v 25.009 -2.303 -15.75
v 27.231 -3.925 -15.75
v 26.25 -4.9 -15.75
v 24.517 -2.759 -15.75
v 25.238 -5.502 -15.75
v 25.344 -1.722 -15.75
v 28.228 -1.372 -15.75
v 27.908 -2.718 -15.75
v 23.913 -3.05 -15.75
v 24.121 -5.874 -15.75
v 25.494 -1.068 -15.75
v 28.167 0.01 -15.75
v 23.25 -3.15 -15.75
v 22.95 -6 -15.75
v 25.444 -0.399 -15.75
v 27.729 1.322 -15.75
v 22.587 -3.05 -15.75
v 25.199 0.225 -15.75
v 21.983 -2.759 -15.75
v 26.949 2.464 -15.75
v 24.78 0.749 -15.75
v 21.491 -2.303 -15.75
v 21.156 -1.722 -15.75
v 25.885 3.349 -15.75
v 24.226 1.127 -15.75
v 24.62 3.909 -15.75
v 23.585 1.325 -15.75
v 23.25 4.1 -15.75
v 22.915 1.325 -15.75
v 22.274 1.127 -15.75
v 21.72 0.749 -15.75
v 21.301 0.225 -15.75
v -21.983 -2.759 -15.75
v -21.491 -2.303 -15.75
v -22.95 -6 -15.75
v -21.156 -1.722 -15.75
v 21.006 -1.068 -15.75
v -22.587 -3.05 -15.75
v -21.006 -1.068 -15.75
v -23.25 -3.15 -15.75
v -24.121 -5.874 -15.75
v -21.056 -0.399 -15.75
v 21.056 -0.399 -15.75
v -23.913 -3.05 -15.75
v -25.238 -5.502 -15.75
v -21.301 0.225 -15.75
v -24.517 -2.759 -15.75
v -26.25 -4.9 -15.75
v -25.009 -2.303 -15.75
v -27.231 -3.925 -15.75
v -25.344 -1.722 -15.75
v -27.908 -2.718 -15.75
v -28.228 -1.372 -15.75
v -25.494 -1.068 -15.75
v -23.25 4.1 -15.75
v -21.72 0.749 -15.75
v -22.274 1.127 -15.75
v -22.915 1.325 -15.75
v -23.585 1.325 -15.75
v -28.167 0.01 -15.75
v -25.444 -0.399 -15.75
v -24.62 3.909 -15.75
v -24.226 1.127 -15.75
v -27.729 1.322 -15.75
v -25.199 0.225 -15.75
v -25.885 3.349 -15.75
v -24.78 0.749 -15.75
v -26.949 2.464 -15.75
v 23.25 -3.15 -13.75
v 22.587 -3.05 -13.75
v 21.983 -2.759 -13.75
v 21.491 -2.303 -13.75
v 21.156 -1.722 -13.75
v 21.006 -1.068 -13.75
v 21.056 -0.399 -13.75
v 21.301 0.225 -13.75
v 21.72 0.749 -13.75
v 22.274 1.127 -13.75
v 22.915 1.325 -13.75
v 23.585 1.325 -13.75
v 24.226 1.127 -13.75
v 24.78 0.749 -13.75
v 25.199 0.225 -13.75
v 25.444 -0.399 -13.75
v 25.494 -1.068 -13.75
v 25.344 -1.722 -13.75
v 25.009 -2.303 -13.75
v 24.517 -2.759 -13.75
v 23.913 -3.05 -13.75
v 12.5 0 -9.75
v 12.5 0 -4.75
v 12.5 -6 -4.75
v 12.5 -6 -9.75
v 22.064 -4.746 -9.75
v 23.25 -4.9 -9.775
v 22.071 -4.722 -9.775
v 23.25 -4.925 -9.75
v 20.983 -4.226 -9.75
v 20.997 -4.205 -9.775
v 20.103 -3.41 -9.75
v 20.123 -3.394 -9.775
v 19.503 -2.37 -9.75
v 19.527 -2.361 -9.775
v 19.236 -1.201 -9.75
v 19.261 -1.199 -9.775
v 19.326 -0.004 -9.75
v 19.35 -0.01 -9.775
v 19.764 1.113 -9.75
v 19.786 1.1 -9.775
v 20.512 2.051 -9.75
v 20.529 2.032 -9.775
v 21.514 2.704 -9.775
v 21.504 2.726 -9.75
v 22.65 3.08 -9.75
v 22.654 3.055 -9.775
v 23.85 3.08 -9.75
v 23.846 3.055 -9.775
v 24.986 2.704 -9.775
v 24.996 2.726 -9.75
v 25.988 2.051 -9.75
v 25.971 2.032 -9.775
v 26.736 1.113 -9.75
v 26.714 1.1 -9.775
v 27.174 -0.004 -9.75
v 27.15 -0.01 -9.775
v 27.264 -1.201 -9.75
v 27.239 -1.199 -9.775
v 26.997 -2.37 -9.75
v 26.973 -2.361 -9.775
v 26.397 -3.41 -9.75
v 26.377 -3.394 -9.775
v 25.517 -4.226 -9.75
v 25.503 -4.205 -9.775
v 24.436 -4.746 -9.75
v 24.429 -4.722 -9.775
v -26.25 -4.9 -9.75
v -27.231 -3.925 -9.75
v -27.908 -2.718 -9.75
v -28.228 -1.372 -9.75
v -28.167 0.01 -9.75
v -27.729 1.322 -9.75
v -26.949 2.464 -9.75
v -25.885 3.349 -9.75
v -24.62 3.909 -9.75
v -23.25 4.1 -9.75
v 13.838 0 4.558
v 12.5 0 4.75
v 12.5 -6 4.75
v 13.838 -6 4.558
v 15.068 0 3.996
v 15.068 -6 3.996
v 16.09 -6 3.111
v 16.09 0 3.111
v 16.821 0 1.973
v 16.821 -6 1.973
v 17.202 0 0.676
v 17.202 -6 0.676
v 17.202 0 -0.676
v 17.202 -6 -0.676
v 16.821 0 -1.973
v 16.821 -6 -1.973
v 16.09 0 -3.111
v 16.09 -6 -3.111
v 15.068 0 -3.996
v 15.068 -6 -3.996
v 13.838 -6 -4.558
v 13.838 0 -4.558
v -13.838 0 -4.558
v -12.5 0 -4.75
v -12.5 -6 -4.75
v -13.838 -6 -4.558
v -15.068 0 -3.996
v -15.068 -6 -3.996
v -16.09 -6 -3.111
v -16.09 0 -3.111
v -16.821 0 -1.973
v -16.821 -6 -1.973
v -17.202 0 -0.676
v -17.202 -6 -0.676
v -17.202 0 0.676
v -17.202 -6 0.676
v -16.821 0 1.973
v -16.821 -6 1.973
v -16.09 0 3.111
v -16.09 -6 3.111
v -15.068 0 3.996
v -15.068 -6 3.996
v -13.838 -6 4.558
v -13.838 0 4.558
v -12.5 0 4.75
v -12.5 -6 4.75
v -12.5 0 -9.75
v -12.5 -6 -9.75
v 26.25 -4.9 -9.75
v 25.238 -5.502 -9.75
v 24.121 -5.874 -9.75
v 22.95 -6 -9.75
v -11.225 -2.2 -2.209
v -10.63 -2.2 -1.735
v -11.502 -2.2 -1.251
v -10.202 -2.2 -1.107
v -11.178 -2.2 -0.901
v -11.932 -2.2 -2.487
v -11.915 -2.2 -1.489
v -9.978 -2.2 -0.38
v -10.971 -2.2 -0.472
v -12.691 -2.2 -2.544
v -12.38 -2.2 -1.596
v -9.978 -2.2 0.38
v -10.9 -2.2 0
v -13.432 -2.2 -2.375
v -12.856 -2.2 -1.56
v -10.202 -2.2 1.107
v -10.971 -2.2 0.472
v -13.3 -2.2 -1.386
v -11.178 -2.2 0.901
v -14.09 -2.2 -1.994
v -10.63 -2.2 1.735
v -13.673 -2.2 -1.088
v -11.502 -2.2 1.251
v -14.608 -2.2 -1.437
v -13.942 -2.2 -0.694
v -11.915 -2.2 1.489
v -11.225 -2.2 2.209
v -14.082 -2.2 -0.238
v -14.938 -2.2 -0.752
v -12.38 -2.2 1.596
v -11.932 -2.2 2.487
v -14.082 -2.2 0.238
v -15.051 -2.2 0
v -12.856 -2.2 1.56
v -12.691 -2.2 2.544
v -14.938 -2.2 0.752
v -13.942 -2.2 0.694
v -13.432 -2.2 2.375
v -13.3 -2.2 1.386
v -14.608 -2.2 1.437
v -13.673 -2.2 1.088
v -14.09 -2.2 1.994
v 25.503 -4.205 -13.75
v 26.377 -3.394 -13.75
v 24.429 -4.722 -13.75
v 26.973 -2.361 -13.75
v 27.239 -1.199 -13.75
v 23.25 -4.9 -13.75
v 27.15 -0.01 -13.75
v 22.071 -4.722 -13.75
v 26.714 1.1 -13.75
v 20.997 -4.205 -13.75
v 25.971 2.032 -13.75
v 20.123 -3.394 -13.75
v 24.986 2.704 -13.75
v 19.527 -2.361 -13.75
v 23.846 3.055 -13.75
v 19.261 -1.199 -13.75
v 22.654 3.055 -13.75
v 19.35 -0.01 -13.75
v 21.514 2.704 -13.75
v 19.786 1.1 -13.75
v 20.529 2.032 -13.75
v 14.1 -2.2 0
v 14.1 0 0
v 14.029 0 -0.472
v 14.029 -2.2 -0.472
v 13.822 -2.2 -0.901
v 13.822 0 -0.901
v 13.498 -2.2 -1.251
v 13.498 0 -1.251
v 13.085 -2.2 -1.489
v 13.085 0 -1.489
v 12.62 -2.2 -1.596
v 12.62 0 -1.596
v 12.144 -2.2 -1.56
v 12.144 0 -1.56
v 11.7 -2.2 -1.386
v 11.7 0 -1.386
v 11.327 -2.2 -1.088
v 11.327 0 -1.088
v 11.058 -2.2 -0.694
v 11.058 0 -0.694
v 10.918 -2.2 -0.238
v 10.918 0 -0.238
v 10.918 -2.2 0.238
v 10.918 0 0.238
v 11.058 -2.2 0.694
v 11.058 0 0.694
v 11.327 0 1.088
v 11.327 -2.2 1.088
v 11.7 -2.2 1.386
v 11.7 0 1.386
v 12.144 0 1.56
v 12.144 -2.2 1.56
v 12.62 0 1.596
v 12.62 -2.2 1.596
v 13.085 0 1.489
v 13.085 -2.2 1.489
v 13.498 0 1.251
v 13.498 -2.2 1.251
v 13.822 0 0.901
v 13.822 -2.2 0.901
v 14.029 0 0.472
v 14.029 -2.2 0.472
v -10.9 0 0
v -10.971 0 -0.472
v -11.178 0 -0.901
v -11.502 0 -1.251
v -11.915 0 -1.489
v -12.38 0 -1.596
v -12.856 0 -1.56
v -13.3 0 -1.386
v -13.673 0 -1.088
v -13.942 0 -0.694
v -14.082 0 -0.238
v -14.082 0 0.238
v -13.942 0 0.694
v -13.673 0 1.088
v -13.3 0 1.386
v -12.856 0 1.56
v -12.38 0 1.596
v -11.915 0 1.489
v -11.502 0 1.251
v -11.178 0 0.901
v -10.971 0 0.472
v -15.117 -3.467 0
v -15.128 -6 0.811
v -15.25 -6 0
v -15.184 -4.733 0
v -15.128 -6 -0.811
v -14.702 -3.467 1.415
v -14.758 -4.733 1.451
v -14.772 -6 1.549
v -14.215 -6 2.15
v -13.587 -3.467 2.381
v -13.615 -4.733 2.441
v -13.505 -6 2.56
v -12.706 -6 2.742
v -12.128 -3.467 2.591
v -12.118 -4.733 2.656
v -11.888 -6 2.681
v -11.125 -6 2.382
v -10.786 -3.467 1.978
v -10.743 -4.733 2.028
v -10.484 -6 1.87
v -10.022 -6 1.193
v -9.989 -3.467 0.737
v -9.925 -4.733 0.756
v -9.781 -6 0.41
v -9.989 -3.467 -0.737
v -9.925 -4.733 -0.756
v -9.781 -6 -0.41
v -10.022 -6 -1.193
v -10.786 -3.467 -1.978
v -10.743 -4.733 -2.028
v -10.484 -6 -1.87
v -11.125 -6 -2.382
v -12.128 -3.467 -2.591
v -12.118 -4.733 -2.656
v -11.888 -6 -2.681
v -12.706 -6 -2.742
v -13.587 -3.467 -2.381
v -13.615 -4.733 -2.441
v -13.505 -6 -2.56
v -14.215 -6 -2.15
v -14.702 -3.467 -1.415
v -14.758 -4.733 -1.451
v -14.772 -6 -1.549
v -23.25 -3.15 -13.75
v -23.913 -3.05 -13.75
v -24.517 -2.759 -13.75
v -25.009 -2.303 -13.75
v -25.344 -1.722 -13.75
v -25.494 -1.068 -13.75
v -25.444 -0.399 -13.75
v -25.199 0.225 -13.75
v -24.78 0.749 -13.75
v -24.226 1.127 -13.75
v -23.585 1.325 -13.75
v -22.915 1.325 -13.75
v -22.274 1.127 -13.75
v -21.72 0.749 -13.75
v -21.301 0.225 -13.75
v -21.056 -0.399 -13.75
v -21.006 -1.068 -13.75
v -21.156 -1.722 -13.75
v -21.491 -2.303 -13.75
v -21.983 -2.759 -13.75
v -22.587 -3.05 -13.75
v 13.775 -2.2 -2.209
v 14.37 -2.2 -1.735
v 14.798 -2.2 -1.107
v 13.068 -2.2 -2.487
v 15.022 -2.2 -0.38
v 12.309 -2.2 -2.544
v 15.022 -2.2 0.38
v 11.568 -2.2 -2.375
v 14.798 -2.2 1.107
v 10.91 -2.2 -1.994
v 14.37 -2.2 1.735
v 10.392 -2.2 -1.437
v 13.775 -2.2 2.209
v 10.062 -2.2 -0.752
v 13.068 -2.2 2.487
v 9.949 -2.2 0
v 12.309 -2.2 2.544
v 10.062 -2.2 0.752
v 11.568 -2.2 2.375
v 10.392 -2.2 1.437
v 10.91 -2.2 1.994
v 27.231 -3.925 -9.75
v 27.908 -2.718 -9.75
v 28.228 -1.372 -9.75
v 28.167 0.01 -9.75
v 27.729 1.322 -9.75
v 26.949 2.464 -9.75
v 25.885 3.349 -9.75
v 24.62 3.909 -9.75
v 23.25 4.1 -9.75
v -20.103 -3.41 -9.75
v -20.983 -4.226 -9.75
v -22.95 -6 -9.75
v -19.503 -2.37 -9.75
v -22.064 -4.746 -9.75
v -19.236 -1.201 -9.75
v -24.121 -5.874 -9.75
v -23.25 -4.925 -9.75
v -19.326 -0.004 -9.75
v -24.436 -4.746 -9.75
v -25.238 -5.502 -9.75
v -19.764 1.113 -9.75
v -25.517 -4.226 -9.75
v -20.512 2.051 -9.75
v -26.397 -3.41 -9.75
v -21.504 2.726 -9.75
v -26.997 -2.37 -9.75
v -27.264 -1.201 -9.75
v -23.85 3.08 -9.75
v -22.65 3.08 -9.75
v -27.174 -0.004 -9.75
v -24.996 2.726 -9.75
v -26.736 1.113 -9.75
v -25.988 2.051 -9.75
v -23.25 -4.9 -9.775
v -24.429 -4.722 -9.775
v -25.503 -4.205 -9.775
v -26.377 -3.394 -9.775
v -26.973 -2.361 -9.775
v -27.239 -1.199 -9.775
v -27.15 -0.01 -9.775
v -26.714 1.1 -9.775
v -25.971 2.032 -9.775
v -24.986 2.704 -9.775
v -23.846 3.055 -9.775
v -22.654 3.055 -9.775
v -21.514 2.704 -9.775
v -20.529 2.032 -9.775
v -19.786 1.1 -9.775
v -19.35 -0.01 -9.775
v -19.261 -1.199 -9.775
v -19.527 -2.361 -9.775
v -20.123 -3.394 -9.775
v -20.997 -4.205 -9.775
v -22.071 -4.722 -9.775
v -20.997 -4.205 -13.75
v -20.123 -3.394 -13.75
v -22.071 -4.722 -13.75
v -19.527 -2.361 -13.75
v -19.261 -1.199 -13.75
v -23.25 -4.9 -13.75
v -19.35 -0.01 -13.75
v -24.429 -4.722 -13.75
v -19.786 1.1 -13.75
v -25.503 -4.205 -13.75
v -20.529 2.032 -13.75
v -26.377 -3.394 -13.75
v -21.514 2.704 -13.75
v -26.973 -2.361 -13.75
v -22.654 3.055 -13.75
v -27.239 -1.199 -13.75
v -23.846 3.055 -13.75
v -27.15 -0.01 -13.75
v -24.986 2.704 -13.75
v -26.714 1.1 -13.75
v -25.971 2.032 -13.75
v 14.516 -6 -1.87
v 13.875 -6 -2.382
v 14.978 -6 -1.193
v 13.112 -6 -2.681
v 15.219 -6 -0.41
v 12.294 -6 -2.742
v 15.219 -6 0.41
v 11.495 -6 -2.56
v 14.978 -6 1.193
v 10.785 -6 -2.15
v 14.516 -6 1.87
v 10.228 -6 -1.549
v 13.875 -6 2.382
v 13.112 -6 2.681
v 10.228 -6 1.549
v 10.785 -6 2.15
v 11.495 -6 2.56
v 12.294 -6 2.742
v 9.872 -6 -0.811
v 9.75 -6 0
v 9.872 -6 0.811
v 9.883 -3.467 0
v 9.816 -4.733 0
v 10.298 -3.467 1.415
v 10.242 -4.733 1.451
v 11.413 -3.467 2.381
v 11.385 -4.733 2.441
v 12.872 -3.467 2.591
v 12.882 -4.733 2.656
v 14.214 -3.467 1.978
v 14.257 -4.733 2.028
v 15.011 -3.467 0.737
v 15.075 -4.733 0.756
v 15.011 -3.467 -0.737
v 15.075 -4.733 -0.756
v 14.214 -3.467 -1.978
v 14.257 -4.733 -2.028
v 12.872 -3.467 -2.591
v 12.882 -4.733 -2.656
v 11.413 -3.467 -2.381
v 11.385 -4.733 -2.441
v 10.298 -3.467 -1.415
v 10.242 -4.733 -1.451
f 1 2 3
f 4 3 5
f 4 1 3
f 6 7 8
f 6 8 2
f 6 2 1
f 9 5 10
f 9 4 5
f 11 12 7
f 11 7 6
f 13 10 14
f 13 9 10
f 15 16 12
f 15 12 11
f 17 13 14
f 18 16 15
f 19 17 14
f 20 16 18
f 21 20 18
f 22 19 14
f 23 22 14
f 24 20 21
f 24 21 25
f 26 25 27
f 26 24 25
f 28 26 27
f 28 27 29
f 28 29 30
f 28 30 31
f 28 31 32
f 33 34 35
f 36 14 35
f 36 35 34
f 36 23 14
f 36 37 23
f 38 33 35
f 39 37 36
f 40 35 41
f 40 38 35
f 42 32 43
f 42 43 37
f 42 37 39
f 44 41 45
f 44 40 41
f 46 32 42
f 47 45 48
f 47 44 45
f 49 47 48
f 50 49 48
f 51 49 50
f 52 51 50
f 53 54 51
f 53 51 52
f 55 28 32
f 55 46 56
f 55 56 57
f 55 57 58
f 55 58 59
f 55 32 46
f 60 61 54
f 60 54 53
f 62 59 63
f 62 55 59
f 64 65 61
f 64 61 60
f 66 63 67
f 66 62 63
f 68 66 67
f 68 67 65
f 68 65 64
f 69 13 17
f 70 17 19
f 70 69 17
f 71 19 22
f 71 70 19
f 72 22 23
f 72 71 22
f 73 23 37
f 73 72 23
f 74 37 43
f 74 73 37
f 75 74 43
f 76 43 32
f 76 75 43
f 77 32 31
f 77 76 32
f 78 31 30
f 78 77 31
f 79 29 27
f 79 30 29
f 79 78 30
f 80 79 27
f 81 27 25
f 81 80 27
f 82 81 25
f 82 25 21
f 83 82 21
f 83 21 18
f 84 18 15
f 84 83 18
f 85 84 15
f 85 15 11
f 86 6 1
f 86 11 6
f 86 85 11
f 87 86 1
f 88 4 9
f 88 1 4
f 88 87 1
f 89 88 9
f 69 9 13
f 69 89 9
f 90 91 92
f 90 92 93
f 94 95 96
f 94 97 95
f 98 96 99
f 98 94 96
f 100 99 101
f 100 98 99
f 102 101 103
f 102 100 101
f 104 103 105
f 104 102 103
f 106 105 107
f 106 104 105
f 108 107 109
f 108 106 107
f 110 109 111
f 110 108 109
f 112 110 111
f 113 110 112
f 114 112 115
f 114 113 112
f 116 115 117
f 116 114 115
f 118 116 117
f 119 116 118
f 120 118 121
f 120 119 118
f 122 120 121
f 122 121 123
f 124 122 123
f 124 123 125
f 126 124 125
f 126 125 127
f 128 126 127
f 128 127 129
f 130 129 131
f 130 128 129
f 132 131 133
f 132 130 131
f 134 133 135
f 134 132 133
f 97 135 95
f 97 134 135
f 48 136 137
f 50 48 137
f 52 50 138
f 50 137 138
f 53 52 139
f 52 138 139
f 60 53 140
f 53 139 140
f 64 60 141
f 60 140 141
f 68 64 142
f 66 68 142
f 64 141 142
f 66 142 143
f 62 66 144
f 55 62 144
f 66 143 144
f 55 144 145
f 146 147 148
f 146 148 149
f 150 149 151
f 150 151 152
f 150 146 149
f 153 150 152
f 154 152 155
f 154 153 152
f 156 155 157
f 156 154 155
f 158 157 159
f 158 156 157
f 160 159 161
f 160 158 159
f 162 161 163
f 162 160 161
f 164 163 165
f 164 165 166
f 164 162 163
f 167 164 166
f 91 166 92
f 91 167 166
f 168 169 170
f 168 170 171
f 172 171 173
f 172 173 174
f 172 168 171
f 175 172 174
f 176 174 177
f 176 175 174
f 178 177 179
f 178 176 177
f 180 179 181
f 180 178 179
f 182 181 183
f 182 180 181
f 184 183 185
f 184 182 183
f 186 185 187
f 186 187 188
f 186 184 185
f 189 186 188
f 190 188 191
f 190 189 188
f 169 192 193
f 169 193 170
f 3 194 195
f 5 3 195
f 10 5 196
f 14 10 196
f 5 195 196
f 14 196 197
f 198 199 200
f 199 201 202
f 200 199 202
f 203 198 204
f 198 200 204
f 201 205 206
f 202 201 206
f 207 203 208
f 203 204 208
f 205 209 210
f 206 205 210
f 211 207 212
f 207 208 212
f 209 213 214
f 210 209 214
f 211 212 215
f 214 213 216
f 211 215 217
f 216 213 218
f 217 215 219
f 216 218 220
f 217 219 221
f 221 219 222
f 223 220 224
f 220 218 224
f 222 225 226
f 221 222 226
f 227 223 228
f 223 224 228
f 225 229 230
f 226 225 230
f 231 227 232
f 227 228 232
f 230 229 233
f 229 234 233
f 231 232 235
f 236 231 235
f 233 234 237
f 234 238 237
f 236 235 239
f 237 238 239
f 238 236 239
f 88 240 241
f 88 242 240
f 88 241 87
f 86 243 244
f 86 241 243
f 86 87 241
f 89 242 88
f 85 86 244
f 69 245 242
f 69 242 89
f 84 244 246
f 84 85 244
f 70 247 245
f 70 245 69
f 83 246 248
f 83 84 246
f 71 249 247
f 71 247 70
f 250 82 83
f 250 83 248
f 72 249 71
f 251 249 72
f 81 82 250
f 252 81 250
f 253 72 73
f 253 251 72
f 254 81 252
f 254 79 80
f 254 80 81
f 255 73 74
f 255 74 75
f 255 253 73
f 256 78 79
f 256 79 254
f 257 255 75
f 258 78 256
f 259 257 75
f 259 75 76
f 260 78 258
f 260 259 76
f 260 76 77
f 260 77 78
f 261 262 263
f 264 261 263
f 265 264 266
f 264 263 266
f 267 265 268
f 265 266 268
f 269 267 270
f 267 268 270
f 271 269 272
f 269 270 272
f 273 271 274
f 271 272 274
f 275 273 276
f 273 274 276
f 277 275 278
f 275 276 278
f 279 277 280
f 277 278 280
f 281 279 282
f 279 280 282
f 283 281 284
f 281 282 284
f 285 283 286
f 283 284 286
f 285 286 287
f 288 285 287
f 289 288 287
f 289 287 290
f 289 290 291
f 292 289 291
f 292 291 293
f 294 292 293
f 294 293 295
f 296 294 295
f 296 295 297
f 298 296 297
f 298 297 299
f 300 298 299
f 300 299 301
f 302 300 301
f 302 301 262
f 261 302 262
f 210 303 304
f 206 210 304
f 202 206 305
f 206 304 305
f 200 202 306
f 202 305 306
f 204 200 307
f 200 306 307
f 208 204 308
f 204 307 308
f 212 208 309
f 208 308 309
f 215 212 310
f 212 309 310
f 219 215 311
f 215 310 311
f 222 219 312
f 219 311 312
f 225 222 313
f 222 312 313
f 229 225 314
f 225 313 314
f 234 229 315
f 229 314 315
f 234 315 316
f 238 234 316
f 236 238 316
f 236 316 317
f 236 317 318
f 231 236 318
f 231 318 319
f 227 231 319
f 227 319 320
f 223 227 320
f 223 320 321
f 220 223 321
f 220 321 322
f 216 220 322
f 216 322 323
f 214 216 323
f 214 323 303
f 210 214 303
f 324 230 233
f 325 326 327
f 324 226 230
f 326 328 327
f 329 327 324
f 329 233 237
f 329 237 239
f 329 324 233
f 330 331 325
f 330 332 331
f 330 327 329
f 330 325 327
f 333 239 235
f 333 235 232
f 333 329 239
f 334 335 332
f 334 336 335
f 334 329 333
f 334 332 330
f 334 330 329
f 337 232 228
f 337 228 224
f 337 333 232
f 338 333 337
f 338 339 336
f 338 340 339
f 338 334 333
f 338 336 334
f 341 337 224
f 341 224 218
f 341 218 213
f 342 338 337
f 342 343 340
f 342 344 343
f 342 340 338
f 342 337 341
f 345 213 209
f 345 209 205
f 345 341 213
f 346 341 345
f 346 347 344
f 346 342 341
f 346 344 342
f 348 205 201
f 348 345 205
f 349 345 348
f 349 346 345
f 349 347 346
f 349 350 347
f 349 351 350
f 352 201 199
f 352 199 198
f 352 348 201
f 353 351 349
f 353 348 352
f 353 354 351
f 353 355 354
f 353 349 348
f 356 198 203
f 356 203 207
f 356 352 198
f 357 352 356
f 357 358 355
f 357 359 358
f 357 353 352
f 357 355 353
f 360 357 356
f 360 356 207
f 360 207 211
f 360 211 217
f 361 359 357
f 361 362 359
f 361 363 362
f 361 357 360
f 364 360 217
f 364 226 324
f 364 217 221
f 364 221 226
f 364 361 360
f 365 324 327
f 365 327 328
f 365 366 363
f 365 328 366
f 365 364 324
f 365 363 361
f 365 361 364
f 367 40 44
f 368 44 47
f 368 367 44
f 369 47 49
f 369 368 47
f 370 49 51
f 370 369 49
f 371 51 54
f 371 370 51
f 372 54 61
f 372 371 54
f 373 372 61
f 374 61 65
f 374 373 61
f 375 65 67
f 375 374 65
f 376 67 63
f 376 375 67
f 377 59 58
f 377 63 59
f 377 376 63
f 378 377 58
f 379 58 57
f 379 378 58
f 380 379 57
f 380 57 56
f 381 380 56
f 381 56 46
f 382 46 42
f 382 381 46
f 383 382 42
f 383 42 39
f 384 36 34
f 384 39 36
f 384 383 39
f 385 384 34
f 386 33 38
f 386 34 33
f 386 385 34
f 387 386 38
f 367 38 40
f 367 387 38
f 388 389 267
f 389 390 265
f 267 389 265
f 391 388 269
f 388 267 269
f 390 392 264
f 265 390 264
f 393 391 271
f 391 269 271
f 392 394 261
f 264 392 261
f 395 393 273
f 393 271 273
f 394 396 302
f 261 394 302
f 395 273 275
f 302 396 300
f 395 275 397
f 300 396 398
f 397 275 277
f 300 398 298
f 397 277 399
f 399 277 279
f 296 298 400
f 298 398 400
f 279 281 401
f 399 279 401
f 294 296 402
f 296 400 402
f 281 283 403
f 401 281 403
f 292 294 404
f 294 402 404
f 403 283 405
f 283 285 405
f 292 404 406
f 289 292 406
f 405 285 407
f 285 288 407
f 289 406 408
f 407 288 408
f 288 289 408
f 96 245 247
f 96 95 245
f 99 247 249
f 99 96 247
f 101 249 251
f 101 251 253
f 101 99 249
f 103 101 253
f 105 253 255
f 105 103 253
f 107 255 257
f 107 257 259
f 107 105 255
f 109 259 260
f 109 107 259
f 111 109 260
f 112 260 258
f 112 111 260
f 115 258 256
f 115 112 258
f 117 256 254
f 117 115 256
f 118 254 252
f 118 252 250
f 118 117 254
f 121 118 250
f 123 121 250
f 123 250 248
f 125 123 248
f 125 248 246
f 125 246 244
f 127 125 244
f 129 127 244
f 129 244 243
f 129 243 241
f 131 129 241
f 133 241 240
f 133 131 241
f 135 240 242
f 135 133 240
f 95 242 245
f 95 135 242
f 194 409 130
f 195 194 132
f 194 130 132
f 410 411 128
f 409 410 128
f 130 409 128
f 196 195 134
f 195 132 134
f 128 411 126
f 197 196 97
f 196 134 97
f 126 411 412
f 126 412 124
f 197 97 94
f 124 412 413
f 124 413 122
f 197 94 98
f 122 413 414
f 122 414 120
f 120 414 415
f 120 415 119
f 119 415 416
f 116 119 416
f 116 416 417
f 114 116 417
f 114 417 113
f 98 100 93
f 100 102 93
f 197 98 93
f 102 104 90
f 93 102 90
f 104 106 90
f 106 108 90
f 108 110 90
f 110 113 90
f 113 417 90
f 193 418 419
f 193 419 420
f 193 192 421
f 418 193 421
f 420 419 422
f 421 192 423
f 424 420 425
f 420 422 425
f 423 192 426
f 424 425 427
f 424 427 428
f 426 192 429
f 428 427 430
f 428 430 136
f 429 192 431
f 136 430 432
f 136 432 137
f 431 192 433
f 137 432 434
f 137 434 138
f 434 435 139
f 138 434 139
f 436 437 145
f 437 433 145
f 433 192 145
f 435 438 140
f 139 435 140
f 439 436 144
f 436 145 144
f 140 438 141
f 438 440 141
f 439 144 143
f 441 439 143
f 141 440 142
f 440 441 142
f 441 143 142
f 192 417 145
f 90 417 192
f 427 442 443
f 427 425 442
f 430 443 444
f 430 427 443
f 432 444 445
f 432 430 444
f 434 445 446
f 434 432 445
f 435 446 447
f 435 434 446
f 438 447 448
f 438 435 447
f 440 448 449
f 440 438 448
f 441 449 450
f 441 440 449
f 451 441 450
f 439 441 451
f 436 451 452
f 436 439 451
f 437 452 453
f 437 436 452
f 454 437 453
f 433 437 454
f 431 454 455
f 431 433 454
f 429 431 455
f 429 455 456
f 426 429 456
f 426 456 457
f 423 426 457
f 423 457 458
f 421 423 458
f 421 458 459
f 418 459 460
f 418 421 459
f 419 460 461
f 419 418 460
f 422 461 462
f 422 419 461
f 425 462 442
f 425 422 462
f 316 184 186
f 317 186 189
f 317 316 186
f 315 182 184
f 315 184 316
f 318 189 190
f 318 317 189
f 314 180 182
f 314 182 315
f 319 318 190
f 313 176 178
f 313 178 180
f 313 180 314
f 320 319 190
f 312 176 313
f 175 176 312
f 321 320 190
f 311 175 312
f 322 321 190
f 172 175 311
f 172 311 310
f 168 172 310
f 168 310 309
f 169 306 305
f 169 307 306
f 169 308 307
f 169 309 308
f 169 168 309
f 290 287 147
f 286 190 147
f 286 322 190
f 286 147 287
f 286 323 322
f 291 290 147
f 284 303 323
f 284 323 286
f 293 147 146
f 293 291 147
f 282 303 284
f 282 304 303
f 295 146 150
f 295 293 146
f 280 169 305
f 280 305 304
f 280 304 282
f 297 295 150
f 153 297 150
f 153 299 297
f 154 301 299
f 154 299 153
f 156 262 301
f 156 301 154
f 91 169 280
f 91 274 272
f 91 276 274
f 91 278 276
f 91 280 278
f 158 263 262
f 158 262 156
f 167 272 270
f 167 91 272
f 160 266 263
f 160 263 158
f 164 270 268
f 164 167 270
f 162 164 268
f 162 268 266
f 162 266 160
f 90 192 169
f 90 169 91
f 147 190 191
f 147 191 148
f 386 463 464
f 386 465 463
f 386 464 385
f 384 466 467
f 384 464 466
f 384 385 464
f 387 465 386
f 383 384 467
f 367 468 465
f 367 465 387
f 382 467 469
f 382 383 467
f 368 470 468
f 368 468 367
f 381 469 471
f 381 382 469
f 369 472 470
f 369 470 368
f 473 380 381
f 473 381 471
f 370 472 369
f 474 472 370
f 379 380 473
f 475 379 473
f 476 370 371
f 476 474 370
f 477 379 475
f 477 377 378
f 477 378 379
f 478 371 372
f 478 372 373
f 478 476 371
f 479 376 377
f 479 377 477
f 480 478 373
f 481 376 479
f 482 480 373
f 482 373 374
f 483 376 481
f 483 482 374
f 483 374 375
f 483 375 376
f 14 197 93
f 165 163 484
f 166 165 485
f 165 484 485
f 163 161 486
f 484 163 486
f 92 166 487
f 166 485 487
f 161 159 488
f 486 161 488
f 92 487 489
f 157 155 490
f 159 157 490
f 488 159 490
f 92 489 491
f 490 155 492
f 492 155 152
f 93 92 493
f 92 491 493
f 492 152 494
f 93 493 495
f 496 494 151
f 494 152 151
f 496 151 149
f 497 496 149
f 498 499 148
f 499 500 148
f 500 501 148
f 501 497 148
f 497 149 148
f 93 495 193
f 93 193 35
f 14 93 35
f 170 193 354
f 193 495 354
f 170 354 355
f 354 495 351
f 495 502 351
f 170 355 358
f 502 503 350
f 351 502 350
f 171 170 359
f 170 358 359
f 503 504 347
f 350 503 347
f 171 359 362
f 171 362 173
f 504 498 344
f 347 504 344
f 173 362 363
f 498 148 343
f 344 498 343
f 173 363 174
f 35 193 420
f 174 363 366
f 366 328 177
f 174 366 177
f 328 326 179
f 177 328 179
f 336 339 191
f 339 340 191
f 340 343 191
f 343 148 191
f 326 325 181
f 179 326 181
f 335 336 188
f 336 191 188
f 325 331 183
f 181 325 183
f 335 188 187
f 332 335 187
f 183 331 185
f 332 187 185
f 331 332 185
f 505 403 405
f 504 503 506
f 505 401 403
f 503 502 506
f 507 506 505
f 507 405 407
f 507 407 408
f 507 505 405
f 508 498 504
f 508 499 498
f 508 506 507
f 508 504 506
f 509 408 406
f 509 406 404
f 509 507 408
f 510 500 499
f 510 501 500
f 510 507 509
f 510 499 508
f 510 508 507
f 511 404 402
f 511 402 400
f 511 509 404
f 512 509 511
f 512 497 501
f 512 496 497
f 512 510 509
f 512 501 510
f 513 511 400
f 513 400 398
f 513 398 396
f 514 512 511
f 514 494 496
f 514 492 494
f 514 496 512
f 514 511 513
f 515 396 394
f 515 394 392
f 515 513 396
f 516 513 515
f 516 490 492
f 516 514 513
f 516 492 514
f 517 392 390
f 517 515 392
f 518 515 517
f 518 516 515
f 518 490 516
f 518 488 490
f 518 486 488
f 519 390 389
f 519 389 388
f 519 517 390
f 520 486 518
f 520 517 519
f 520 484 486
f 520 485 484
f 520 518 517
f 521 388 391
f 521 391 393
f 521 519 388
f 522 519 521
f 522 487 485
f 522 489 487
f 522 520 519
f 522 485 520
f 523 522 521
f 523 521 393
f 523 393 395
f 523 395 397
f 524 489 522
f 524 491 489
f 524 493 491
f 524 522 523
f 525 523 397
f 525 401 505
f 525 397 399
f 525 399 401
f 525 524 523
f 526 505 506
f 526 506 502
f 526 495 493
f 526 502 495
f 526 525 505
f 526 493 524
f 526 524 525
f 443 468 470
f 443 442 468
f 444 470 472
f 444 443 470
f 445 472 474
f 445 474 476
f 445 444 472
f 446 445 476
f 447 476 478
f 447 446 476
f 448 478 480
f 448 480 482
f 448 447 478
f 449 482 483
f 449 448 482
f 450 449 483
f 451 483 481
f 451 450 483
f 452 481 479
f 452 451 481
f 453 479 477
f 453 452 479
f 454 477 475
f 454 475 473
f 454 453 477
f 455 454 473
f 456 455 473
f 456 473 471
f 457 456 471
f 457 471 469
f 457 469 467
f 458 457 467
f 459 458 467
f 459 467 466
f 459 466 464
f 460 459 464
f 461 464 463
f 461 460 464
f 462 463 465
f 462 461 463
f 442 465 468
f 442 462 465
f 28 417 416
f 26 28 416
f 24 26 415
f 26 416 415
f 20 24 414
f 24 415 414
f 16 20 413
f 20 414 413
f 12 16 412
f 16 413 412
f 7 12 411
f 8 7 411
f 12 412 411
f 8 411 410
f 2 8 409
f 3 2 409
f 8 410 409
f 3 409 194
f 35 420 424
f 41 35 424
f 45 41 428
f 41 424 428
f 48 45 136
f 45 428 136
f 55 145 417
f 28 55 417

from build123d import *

# Parameters (mm, degrees)
BOSS_EXTRUDE1_DEPTH           = 6
M3_CLEARANCE_HOLE1_D          = 3.2
SKETCH7_R                     = 2.75
CUT_EXTRUDE1_DEPTH            = 3.8
CUT_EXTRUDE1_DRAFT            = 3
CUT_EXTRUDE1_PROFILE_2_DEPTH  = 3.8
CUT_EXTRUDE1_PROFILE_2_DRAFT  = 3
BOSS_EXTRUDE2_DEPTH           = 6
CBORE_FOR_M4_SHCS1_AT_2_COUNT = 2
CBORE_FOR_M4_SHCS1_AT_2_PITCH = 46.5


with BuildPart() as part:
    # Sketch1 → Boss-Extrude1 (new body)
    with BuildSketch(Plane(origin=(0, 0, 0), x_dir=(1, 0, 0), z_dir=(0, 1, 0))):
        with BuildLine():
            Line((-12.5, -4.75), (12.5, -4.75))
            ThreePointArc((12.5, -4.75), (17.25, 0), (12.5, 4.75))
            Line((12.5, 4.75), (12.5, 9.75))
            Line((12.5, 9.75), (-12.5, 9.75))
            Line((-12.5, 9.75), (-12.5, 4.75))
            ThreePointArc((-12.5, 4.75), (-17.25, 0), (-12.5, -4.75))
        make_face()
    extrude(amount=-BOSS_EXTRUDE1_DEPTH)

    # M3 Clearance Hole1 (through all)
    with Locations(Plane(origin=(0, -6, 0), x_dir=(-1, 0, 0), z_dir=(0, -1, 0))):
        with Locations((12.5, 0), (-12.5, 0)):
            Hole(M3_CLEARANCE_HOLE1_D / 2)


with BuildPart() as cut_extrude1_tool:
    # Sketch7 → Cut-Extrude1 (with draft: the straight prism first)
    with BuildSketch(Plane(origin=(0, -6, 0), x_dir=(-1, 0, 0), z_dir=(0, 1, 0))):
        with Locations((12.5, 0)):
            Circle(SKETCH7_R)
    extrude(amount=CUT_EXTRUDE1_DEPTH)
    # Cut-Extrude1: the draft: its side faces are tilted about the plane it starts from
    cut_extrude1_sides = [cut_extrude1_tool.faces().sort_by_distance(p)[0] for p in [
        (-9.75, -4.1, 0),
    ]]
    draft(cut_extrude1_sides, Plane(origin=(0, -6, 0), x_dir=(-1, 0, 0), z_dir=(0, 1, 0)), CUT_EXTRUDE1_DRAFT)


with BuildPart() as part_1:
    add(part.part)

    # Cut-Extrude1: cut by cut_extrude1_tool
    add(cut_extrude1_tool.part, mode=Mode.SUBTRACT)


with BuildPart() as cut_extrude1_profile_2_tool:
    # Sketch7 → Cut-Extrude1 profile 2 (with draft: the straight prism first)
    with BuildSketch(Plane(origin=(0, -6, 0), x_dir=(-1, 0, 0), z_dir=(0, 1, 0))):
        with Locations((-12.5, 0)):
            Circle(SKETCH7_R)
    extrude(amount=CUT_EXTRUDE1_PROFILE_2_DEPTH)
    # Cut-Extrude1 profile 2: the draft: its side faces are tilted about the plane it starts from
    cut_extrude1_profile_2_sides = [cut_extrude1_profile_2_tool.faces().sort_by_distance(p)[0] for p in [
        (15.25, -4.1, 0),
    ]]
    draft(cut_extrude1_profile_2_sides, Plane(origin=(0, -6, 0), x_dir=(-1, 0, 0), z_dir=(0, 1, 0)), CUT_EXTRUDE1_PROFILE_2_DRAFT)


with BuildPart() as part_2:
    add(part_1.part)

    # Cut-Extrude1 profile 2: cut by cut_extrude1_profile_2_tool
    add(cut_extrude1_profile_2_tool.part, mode=Mode.SUBTRACT)

    # Sketch4 → Boss-Extrude2 (add)
    with BuildSketch(Plane(origin=(0, 0, -9.75), x_dir=(-1, 0, 0), z_dir=(0, 0, -1))):
        with BuildLine():
            Line((23.25, 4.1), (-23.25, 4.1))
            ThreePointArc((-23.25, 4.1), (-27.99341649, 0.68113883), (-26.25, -4.9))
            ThreePointArc((-26.25, -4.9), (-24.689252713, -5.717758139), (-22.95, -6))
            Line((-22.95, -6), (22.95, -6))
            ThreePointArc((22.95, -6), (24.689252713, -5.717758139), (26.25, -4.9))
            ThreePointArc((26.25, -4.9), (27.99341649, 0.68113883), (23.25, 4.1))
        make_face()
    extrude(amount=BOSS_EXTRUDE2_DEPTH)

    # Sketch9 → CBORE for M4 SHCS1 (revolve, cut)
    with BuildSketch(Plane(origin=(23.25, -0.9, -9.75), x_dir=(0, -1, 0), z_dir=(1, 0, 0))):
        Polygon((0, 0), (0, 11.351936393), (2.25, 10), (2.25, 4), (4, 4), (4, 0.025), (4.025, 0), align=None)
    cbore_for_m4_shcs1 = revolve(axis=Axis((23.25, -0.9, -3.4), (0, 0, -1)), mode=Mode.SUBTRACT)

    # CBORE for M4 SHCS1 at 2: CBORE for M4 SHCS1 ×2
    with Locations(*[(-i * CBORE_FOR_M4_SHCS1_AT_2_PITCH, 0, 0) for i in range(1, CBORE_FOR_M4_SHCS1_AT_2_COUNT)]):
        add(cbore_for_m4_shcs1, mode=Mode.SUBTRACT)


solid = part_2.part
